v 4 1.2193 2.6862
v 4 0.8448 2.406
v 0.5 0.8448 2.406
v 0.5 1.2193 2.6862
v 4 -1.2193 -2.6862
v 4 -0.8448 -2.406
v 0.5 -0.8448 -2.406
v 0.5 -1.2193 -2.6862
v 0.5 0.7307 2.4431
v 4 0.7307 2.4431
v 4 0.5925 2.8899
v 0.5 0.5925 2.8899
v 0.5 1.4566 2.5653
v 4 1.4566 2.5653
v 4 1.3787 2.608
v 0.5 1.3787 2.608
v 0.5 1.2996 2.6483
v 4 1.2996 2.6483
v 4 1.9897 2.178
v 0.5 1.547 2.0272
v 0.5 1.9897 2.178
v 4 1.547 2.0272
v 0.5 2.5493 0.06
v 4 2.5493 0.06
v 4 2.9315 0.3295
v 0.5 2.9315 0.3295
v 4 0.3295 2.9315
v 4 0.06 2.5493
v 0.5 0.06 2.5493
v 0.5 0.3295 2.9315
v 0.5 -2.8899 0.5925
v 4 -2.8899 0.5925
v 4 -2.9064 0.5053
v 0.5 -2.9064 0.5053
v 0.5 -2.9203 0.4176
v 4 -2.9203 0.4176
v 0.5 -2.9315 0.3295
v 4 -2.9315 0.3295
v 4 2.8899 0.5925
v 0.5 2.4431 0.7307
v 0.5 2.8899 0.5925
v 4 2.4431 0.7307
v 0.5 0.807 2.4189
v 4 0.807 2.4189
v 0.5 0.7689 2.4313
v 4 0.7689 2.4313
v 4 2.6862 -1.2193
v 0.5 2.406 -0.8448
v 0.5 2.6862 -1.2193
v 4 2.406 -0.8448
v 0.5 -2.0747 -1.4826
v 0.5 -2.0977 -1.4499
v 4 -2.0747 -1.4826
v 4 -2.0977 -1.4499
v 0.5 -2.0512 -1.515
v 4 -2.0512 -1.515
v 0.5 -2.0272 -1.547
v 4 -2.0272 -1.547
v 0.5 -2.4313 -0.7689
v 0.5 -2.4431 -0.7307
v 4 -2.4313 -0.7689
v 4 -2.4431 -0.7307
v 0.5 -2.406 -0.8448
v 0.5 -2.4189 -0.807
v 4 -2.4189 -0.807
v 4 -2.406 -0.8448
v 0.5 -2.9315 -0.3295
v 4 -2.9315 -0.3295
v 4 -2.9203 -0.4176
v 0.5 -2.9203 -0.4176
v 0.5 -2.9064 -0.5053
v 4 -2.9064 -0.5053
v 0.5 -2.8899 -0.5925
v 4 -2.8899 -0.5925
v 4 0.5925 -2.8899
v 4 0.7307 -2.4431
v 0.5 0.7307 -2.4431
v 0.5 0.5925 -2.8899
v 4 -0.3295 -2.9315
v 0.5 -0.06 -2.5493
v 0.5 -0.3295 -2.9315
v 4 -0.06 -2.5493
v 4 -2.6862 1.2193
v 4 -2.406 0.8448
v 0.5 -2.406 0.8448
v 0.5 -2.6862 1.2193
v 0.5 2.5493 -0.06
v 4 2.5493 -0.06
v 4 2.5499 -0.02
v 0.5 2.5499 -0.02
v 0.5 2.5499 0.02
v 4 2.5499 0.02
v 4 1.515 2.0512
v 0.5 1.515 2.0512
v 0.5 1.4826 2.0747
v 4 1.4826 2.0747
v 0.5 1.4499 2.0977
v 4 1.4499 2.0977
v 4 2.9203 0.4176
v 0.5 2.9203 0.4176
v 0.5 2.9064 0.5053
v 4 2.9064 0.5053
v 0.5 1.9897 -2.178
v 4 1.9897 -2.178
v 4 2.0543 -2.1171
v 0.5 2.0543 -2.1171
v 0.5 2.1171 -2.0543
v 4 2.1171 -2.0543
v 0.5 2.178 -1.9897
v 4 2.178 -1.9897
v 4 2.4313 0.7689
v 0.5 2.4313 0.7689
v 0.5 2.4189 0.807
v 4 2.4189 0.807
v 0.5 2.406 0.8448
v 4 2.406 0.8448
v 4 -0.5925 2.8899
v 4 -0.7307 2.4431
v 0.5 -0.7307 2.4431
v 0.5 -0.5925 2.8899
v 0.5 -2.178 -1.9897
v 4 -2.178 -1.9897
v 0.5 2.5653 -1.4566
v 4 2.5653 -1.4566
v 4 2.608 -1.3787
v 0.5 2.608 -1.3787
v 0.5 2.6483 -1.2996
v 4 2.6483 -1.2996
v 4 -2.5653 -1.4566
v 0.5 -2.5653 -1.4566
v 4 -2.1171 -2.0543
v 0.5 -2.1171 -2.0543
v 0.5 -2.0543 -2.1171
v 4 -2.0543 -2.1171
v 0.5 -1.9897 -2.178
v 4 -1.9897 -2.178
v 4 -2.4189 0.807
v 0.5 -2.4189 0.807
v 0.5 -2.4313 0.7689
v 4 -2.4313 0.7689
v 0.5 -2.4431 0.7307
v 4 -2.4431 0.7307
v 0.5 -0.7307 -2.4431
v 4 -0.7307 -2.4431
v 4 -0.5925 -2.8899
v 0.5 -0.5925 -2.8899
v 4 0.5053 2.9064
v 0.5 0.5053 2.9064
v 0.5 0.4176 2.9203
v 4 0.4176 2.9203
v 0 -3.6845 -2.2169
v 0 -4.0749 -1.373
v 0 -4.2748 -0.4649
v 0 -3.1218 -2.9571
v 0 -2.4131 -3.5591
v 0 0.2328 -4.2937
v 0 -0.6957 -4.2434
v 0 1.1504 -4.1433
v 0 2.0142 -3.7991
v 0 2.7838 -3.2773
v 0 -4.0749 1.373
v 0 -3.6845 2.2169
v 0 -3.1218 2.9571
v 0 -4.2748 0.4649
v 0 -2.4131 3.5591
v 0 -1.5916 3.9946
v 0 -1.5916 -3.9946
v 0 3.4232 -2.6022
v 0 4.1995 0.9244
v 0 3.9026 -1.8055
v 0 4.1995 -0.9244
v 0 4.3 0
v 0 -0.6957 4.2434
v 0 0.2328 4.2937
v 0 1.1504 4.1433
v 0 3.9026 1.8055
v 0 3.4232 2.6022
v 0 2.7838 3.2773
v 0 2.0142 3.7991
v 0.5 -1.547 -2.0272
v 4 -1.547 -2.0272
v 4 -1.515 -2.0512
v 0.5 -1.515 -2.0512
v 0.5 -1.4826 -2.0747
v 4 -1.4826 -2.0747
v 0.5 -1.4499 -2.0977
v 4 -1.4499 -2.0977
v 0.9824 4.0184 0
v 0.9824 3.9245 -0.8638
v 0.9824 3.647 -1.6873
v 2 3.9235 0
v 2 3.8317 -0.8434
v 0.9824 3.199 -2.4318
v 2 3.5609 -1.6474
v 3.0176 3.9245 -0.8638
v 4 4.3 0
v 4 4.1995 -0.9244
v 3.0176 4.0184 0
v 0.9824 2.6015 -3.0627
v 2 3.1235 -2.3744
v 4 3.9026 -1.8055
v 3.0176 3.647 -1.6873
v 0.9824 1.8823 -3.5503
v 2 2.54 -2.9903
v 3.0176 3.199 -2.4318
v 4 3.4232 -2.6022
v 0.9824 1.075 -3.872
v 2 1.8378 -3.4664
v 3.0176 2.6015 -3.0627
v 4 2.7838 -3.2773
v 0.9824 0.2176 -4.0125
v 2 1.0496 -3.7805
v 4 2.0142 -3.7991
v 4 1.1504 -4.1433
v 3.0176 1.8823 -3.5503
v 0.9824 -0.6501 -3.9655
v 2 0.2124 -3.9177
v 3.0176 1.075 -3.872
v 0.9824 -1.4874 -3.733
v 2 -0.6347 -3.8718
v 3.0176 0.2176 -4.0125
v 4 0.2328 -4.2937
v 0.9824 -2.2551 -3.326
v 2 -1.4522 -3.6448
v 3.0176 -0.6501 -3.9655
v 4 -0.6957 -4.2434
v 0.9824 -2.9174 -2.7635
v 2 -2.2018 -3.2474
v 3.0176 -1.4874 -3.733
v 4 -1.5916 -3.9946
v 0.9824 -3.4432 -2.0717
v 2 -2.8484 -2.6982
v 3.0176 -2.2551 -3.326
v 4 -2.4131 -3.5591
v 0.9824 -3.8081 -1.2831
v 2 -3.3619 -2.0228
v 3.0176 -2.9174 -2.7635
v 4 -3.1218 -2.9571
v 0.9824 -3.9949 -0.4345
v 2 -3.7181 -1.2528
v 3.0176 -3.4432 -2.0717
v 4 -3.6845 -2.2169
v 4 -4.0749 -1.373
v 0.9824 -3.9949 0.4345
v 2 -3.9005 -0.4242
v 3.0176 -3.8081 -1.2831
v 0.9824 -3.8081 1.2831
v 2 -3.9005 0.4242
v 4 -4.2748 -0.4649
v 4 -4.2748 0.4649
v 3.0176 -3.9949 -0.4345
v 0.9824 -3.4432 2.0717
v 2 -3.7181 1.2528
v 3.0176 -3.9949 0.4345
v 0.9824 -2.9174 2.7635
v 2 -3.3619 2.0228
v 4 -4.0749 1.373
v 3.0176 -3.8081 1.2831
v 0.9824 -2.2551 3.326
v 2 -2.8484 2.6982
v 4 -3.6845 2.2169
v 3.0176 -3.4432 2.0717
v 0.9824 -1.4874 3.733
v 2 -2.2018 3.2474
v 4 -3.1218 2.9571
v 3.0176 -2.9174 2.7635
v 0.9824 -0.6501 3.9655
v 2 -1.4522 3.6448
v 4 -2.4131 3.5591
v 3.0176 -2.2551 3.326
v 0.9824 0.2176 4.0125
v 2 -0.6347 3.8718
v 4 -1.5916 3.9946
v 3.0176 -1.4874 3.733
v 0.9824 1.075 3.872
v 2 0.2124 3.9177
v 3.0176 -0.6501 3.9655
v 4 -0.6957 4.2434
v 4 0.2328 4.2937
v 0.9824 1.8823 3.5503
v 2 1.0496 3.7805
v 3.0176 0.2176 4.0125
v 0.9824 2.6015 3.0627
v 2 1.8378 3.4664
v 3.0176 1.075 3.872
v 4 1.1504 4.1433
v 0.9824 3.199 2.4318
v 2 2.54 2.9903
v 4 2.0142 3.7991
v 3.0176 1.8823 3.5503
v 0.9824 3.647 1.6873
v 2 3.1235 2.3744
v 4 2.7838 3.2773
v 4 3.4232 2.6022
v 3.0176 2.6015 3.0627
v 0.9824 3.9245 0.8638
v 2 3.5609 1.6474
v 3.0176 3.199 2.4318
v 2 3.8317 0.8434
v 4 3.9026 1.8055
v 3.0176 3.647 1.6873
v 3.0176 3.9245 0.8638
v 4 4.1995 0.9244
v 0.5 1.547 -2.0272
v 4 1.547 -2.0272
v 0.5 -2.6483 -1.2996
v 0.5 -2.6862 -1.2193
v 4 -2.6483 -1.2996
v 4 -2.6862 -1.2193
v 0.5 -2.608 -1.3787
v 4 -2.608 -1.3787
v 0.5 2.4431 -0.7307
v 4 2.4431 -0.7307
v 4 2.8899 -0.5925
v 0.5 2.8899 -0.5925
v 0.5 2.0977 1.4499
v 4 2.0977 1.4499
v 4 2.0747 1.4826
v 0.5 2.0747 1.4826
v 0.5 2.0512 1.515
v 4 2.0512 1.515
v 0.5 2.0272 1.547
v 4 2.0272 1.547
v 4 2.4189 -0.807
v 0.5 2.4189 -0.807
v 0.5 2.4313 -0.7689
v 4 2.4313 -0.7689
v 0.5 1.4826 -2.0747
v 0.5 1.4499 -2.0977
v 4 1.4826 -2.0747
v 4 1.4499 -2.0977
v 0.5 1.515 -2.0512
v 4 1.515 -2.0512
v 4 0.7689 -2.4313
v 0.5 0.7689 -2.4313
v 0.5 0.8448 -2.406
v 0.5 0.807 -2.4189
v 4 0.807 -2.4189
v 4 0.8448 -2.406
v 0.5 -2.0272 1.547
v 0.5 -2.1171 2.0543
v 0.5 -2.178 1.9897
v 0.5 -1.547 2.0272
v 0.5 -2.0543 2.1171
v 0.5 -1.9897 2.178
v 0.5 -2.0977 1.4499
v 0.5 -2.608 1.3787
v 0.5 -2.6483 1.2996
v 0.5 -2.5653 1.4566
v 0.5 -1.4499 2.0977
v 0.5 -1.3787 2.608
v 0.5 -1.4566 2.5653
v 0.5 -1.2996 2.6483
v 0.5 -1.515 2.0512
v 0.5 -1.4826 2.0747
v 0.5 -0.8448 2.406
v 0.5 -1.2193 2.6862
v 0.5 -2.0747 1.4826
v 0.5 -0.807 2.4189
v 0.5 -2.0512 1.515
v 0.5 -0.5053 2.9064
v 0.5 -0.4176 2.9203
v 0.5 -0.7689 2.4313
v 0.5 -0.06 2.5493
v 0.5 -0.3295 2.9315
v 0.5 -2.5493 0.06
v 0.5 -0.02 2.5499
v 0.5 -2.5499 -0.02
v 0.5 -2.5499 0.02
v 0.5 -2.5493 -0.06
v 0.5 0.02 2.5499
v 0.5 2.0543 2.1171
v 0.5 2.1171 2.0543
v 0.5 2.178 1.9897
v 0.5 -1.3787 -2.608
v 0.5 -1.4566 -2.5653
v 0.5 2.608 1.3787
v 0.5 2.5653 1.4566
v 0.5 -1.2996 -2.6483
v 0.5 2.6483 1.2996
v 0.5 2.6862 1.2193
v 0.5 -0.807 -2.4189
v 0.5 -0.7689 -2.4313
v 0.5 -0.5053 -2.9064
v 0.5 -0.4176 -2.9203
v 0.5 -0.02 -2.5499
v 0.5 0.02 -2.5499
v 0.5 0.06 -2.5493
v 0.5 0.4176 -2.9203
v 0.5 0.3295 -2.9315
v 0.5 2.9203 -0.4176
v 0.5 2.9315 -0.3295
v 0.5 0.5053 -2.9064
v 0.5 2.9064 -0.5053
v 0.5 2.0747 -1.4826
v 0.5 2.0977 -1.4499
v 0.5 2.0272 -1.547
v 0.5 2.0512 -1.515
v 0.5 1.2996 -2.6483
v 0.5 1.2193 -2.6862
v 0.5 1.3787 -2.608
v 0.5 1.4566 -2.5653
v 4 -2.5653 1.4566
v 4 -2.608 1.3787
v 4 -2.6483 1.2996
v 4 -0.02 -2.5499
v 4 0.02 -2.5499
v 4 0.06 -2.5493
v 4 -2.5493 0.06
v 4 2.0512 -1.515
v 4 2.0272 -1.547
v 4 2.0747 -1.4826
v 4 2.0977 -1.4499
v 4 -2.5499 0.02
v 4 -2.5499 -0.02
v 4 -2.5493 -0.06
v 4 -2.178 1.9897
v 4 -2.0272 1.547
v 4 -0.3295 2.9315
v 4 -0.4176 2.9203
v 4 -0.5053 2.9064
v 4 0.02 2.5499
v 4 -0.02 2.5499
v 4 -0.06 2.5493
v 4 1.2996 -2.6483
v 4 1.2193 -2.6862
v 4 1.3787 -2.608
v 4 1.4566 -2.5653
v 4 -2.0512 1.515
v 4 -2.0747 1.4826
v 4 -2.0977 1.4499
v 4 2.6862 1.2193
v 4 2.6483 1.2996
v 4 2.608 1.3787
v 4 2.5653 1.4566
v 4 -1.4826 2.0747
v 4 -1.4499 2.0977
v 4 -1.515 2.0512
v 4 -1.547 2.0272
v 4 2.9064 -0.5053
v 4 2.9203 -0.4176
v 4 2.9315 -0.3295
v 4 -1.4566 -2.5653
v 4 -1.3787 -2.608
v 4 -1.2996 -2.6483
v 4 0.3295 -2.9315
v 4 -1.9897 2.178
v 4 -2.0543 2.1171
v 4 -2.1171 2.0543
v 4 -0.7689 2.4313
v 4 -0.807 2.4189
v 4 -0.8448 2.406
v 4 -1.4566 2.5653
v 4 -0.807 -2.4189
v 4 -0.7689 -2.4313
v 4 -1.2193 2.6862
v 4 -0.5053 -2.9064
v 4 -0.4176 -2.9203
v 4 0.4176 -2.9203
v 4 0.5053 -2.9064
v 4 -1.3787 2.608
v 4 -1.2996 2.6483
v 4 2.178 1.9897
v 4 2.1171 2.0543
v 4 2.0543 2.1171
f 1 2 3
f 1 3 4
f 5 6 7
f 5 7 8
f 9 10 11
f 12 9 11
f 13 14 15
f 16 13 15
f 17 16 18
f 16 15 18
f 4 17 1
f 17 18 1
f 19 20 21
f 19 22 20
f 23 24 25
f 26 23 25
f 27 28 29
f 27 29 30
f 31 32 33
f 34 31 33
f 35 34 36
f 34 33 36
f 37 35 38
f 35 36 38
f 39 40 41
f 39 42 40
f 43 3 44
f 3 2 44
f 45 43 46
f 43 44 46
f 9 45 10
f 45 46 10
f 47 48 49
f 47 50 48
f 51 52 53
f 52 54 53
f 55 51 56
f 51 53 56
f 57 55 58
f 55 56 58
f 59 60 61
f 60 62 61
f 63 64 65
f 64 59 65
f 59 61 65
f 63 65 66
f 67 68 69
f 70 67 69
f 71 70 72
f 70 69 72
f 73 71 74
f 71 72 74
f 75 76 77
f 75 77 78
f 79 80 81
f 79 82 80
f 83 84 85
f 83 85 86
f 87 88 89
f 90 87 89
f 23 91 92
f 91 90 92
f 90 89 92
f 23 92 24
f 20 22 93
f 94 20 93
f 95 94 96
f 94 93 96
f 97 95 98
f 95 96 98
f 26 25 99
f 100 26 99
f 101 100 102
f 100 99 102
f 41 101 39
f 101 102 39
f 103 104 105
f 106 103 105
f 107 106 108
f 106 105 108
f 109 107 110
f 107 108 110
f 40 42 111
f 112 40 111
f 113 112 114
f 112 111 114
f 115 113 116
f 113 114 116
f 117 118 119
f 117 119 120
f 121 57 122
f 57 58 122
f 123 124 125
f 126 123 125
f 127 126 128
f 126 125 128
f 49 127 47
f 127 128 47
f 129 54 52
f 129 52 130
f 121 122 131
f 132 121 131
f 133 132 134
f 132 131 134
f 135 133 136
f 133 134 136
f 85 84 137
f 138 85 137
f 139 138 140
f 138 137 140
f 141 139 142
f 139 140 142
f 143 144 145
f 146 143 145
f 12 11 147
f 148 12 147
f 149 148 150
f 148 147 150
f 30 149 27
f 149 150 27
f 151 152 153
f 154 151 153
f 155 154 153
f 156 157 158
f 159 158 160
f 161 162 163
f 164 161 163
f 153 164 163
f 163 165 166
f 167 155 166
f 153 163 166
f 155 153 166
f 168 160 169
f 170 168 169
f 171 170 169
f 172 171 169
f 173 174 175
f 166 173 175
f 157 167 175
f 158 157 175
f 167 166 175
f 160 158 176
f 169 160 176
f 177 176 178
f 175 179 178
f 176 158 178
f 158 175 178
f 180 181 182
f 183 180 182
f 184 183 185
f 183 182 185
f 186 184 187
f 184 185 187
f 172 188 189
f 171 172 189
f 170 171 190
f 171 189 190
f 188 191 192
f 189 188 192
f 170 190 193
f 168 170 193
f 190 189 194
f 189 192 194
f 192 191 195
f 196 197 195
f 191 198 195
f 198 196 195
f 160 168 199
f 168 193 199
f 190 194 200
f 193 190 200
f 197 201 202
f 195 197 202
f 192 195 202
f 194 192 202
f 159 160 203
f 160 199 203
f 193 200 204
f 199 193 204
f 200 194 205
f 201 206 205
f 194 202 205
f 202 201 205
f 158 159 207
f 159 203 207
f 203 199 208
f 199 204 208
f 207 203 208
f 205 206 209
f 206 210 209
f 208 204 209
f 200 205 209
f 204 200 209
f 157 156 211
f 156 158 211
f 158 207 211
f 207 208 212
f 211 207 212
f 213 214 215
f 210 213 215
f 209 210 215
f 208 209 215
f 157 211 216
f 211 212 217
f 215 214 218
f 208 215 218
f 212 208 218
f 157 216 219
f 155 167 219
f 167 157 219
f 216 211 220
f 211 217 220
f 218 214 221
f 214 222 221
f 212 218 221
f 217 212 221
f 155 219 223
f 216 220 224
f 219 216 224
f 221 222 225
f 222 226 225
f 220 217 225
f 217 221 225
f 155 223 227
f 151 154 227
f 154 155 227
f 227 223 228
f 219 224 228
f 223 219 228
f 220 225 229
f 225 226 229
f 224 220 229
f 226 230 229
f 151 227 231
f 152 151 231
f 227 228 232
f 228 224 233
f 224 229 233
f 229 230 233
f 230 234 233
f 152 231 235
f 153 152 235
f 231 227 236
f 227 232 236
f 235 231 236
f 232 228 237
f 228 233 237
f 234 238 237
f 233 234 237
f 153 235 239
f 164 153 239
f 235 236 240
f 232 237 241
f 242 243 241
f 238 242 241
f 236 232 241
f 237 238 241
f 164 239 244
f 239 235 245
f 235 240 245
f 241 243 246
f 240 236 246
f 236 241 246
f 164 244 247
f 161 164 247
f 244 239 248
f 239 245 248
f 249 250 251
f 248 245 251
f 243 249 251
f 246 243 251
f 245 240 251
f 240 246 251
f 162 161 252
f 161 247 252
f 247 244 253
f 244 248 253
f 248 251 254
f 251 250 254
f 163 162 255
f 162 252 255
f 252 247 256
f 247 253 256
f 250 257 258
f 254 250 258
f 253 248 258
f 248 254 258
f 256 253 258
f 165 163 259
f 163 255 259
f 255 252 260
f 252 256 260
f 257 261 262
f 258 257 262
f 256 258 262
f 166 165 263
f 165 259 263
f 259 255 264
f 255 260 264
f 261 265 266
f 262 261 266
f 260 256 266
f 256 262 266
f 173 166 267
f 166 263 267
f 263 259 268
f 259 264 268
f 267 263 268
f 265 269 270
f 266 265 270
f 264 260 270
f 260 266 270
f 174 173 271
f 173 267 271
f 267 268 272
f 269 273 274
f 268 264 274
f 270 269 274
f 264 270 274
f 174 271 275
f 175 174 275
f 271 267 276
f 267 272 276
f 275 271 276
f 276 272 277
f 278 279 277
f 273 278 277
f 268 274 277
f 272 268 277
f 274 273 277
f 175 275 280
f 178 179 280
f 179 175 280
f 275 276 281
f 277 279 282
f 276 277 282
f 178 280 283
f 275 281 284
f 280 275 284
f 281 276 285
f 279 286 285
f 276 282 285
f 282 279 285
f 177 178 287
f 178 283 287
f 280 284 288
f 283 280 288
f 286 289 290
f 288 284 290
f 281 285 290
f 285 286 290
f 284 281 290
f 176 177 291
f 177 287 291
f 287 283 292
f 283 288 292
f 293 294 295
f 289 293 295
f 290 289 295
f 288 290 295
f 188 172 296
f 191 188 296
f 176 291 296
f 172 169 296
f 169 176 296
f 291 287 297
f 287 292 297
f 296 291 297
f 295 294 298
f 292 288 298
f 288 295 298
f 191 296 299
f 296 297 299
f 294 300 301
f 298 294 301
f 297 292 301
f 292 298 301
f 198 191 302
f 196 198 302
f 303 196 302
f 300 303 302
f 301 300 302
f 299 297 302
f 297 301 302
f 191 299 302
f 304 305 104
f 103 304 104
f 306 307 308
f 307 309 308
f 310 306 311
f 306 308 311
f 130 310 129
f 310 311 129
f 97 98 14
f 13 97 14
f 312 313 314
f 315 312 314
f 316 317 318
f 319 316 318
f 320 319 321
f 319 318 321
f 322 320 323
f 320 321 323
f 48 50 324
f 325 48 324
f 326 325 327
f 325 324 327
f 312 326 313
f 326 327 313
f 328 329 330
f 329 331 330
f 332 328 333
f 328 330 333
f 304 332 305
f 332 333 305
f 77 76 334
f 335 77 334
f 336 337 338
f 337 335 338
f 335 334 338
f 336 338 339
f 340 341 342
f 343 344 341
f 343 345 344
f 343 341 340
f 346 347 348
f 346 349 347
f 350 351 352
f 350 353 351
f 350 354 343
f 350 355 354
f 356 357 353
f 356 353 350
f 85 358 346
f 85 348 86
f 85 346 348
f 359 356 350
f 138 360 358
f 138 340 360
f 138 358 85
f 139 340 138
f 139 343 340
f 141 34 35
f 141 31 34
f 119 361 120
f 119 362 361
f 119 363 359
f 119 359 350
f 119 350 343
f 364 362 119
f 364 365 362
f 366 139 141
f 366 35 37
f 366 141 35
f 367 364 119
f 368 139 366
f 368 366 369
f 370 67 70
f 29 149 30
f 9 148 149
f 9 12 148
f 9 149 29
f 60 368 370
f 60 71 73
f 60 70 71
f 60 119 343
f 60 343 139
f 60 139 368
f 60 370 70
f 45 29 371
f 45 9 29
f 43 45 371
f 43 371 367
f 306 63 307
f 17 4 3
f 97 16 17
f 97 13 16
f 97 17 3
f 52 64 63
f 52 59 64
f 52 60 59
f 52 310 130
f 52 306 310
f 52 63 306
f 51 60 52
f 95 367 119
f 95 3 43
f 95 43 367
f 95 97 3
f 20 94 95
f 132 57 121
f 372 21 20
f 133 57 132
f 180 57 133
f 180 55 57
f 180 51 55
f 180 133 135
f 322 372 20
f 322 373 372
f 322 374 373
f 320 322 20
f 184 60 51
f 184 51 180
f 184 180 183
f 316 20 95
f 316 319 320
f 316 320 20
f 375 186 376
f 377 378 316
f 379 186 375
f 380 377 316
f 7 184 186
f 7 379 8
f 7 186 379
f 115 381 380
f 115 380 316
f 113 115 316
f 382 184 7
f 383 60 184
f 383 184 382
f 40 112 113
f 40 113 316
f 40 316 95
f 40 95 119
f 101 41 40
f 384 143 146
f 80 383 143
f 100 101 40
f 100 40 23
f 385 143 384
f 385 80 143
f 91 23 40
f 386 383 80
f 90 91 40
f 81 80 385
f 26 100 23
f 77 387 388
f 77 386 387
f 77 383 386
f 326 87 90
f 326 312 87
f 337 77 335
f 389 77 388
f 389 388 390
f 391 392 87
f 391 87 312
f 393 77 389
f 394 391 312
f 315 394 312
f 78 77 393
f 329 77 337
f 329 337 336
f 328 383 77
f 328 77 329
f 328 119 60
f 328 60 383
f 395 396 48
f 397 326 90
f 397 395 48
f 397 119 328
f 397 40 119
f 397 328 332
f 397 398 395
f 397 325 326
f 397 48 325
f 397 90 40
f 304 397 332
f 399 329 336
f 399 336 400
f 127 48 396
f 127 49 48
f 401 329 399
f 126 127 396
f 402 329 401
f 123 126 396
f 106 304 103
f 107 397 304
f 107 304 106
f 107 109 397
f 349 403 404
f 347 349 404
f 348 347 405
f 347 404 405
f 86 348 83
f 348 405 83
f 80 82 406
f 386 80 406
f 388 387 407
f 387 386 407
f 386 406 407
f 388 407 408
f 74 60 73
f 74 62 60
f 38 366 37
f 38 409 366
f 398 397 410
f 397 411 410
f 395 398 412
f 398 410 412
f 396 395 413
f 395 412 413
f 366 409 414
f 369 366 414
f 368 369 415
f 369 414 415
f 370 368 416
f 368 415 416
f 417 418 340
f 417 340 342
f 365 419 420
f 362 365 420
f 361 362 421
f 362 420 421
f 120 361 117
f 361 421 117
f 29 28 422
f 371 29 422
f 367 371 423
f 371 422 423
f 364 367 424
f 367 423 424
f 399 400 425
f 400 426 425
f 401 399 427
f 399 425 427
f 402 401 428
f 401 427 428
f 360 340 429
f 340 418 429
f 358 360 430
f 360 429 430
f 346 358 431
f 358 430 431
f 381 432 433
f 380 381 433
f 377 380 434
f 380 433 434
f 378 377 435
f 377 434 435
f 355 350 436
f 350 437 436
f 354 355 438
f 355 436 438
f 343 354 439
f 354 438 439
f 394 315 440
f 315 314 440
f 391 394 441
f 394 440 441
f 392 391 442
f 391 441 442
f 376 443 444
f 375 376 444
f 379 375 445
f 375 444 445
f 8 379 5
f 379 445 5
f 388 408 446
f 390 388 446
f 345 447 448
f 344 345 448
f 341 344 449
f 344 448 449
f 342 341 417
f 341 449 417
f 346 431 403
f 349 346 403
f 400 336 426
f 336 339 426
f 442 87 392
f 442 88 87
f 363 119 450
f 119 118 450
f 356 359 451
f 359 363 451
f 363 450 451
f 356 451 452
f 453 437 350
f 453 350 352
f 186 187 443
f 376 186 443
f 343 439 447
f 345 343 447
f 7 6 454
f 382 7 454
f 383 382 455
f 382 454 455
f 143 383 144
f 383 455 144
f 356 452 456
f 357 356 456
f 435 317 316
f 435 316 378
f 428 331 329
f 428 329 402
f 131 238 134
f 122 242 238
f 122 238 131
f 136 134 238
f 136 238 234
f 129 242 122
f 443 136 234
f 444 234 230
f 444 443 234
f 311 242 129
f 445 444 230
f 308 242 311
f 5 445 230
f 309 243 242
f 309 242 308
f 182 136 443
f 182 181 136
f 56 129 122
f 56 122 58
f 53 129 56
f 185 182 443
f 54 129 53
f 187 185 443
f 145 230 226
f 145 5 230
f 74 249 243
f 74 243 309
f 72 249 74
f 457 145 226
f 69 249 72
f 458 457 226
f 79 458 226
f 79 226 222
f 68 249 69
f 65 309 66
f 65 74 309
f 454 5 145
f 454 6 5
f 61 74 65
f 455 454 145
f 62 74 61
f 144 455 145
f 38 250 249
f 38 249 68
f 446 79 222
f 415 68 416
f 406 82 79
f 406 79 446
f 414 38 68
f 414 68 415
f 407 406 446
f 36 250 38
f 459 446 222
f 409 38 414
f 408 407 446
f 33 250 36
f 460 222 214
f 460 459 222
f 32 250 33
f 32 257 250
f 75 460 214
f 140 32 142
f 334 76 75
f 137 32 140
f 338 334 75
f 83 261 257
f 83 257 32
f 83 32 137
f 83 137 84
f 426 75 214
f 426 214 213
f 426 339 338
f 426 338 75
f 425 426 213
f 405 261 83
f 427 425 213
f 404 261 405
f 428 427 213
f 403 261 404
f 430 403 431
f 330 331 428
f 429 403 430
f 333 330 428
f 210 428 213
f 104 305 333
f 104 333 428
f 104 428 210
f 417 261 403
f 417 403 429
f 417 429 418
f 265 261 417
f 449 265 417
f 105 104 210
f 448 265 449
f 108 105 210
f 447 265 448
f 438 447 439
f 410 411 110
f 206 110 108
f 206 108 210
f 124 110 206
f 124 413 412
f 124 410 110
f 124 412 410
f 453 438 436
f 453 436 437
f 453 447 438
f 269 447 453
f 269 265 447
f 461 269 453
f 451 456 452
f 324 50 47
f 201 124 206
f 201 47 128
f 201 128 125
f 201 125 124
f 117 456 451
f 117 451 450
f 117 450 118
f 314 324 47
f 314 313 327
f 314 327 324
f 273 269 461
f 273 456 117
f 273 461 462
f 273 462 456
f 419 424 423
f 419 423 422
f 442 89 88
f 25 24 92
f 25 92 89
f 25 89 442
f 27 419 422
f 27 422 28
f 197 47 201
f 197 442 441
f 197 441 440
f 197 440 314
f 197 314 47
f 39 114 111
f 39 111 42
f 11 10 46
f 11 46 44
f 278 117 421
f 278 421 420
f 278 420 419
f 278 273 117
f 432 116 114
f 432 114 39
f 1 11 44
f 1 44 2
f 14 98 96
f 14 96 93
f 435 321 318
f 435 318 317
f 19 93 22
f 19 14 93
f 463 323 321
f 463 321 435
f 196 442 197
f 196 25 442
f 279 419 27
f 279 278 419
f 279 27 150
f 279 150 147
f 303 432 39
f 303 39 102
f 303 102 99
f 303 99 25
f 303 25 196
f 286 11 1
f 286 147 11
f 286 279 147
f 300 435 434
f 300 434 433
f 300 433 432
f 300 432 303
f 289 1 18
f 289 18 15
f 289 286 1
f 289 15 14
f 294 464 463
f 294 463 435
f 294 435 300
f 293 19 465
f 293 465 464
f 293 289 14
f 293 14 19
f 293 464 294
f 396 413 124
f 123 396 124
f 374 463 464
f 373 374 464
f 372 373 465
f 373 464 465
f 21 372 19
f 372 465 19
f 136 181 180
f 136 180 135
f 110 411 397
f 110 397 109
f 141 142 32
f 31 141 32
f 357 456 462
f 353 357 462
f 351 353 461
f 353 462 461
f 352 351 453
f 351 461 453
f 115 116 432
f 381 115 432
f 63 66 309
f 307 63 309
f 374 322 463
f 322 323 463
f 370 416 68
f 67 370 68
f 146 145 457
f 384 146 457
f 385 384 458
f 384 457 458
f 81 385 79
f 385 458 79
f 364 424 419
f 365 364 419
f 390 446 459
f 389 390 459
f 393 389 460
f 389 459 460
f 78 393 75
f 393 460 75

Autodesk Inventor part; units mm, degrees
ref_plane "YZ Plane" through (0, 0, 0) normal (1, 0, 0) x (0, 1, 0)
ref_plane "XZ Plane" through (0, 0, 0) normal (0, 1, 0) x (-1, 0, 0)
ref_plane "XY Plane" through (0, 0, 0) normal (0, 0, 1) x (1, 0, 0)
sketch "Esboço2" plane through (0, 0, 0) normal (0, 0, 1) x (1, 0, 0)
  line L0 (0, 0) -> (4, 0)
  line L1 (4, 0) -> (4, 4.3)
  line L2 (0, 4.3) -> (0, 0)
  arc A0 (0, 4.3) -> (4, 4.3) centre (2, 9.4235) ccw
  dimension "d0" = 4
  dimension "d1" = 4.3
  dimension "d70" = 5.5
revolve "Revolução1" add sketch "Esboço2" angle 360 about axis through (0, 0, 0) along (1, 0, 0)
sketch "Esboço11" plane through (4, 0, 0) normal (1, 0, 0) x (0, 0, -1)
  circle A0 centre (0, 0) radius 2.55
  circle A1 centre (0, 0) radius 2.95
  line L0 (0, 0) -> (2.95, 0)
  line L1 (2.55, 0) -> (2.5493, 0.06)
  line L2 (2.5493, 0.06) -> (2.55, 0)
  line L3 (2.55, 0) -> (2.5493, -0.06)
  line L4 (2.5493, 0.06) -> (2.9315, 0.3295)
  line L5 (2.5493, -0.06) -> (2.9315, -0.3295)
  line L6 (2.9315, 0.3295) -> (2.9255, 0.3791)
  line L7 (2.9315, -0.3295) -> (2.9255, -0.3791)
  line L8 (2.406, 0.8448) -> (2.6862, 1.2193)
  line L9 (2.4252, 0.788) -> (2.406, 0.8448)
  line L10 (2.4252, 0.788) -> (2.4431, 0.7307)
  line L11 (2.4431, 0.7307) -> (2.8899, 0.5925)
  circle A2 centre (0, 0) radius 2.95
  line L12 (2.6862, 1.2193) -> (2.6652, 1.2646)
  line L13 (2.8899, 0.5925) -> (2.8995, 0.5435)
  line L14 (2.0272, 1.547) -> (2.178, 1.9897)
  line L15 (2.063, 1.4989) -> (2.0272, 1.547)
  line L16 (2.063, 1.4989) -> (2.0977, 1.4499)
  line L17 (2.0977, 1.4499) -> (2.5653, 1.4566)
  circle A3 centre (0, 0) radius 2.95
  line L18 (2.178, 1.9897) -> (2.144, 2.0263)
  line L19 (2.5653, 1.4566) -> (2.5897, 1.4129)
  line L20 (1.4499, 2.0977) -> (1.4566, 2.5653)
  line L21 (1.4989, 2.063) -> (1.4499, 2.0977)
  line L22 (1.4989, 2.063) -> (1.547, 2.0272)
  line L23 (1.547, 2.0272) -> (1.9897, 2.178)
  circle A4 centre (0, 0) radius 2.95
  line L24 (1.4566, 2.5653) -> (1.4129, 2.5897)
  line L25 (1.9897, 2.178) -> (2.0263, 2.144)
  line L26 (0.7307, 2.4431) -> (0.5925, 2.8899)
  line L27 (0.788, 2.4252) -> (0.7307, 2.4431)
  line L28 (0.788, 2.4252) -> (0.8448, 2.406)
  line L29 (0.8448, 2.406) -> (1.2193, 2.6862)
  circle A5 centre (0, 0) radius 2.95
  line L30 (0.5925, 2.8899) -> (0.5435, 2.8995)
  line L31 (1.2193, 2.6862) -> (1.2646, 2.6652)
  line L32 (-0.06, 2.5493) -> (-0.3295, 2.9315)
  line L33 (0, 2.55) -> (-0.06, 2.5493)
  line L34 (0, 2.55) -> (0.06, 2.5493)
  line L35 (0.06, 2.5493) -> (0.3295, 2.9315)
  circle A6 centre (0, 0) radius 2.95
  line L36 (-0.3295, 2.9315) -> (-0.3791, 2.9255)
  line L37 (0.3295, 2.9315) -> (0.3791, 2.9255)
  line L38 (-0.8448, 2.406) -> (-1.2193, 2.6862)
  line L39 (-0.788, 2.4252) -> (-0.8448, 2.406)
  line L40 (-0.788, 2.4252) -> (-0.7307, 2.4431)
  line L41 (-0.7307, 2.4431) -> (-0.5925, 2.8899)
  circle A7 centre (0, 0) radius 2.95
  line L42 (-1.2193, 2.6862) -> (-1.2646, 2.6652)
  line L43 (-0.5925, 2.8899) -> (-0.5435, 2.8995)
  line L44 (-1.547, 2.0272) -> (-1.9897, 2.178)
  line L45 (-1.4989, 2.063) -> (-1.547, 2.0272)
  line L46 (-1.4989, 2.063) -> (-1.4499, 2.0977)
  line L47 (-1.4499, 2.0977) -> (-1.4566, 2.5653)
  circle A8 centre (0, 0) radius 2.95
  line L48 (-1.9897, 2.178) -> (-2.0263, 2.144)
  line L49 (-1.4566, 2.5653) -> (-1.4129, 2.5897)
  line L50 (-2.0977, 1.4499) -> (-2.5653, 1.4566)
  line L51 (-2.063, 1.4989) -> (-2.0977, 1.4499)
  line L52 (-2.063, 1.4989) -> (-2.0272, 1.547)
  line L53 (-2.0272, 1.547) -> (-2.178, 1.9897)
  circle A9 centre (0, 0) radius 2.95
  line L54 (-2.5653, 1.4566) -> (-2.5897, 1.4129)
  line L55 (-2.178, 1.9897) -> (-2.144, 2.0263)
  line L56 (-2.4431, 0.7307) -> (-2.8899, 0.5925)
  line L57 (-2.4252, 0.788) -> (-2.4431, 0.7307)
  line L58 (-2.4252, 0.788) -> (-2.406, 0.8448)
  line L59 (-2.406, 0.8448) -> (-2.6862, 1.2193)
  circle A10 centre (0, 0) radius 2.95
  line L60 (-2.8899, 0.5925) -> (-2.8995, 0.5435)
  line L61 (-2.6862, 1.2193) -> (-2.6652, 1.2646)
  line L62 (-2.5493, -0.06) -> (-2.9315, -0.3295)
  line L63 (-2.55, 0) -> (-2.5493, -0.06)
  line L64 (-2.55, 0) -> (-2.5493, 0.06)
  line L65 (-2.5493, 0.06) -> (-2.9315, 0.3295)
  circle A11 centre (0, 0) radius 2.95
  line L66 (-2.9315, -0.3295) -> (-2.9255, -0.3791)
  line L67 (-2.9315, 0.3295) -> (-2.9255, 0.3791)
  line L68 (-2.406, -0.8448) -> (-2.6862, -1.2193)
  line L69 (-2.4252, -0.788) -> (-2.406, -0.8448)
  line L70 (-2.4252, -0.788) -> (-2.4431, -0.7307)
  line L71 (-2.4431, -0.7307) -> (-2.8899, -0.5925)
  circle A12 centre (0, 0) radius 2.95
  line L72 (-2.6862, -1.2193) -> (-2.6652, -1.2646)
  line L73 (-2.8899, -0.5925) -> (-2.8995, -0.5435)
  line L74 (-2.0272, -1.547) -> (-2.178, -1.9897)
  line L75 (-2.063, -1.4989) -> (-2.0272, -1.547)
  line L76 (-2.063, -1.4989) -> (-2.0977, -1.4499)
  line L77 (-2.0977, -1.4499) -> (-2.5653, -1.4566)
  circle A13 centre (0, 0) radius 2.95
  line L78 (-2.178, -1.9897) -> (-2.144, -2.0263)
  line L79 (-2.5653, -1.4566) -> (-2.5897, -1.4129)
  line L80 (-1.4499, -2.0977) -> (-1.4566, -2.5653)
  line L81 (-1.4989, -2.063) -> (-1.4499, -2.0977)
  line L82 (-1.4989, -2.063) -> (-1.547, -2.0272)
  line L83 (-1.547, -2.0272) -> (-1.9897, -2.178)
  circle A14 centre (0, 0) radius 2.95
  line L84 (-1.4566, -2.5653) -> (-1.4129, -2.5897)
  line L85 (-1.9897, -2.178) -> (-2.0263, -2.144)
  line L86 (-0.7307, -2.4431) -> (-0.5925, -2.8899)
  line L87 (-0.788, -2.4252) -> (-0.7307, -2.4431)
  line L88 (-0.788, -2.4252) -> (-0.8448, -2.406)
  line L89 (-0.8448, -2.406) -> (-1.2193, -2.6862)
  circle A15 centre (0, 0) radius 2.95
  line L90 (-0.5925, -2.8899) -> (-0.5435, -2.8995)
  line L91 (-1.2193, -2.6862) -> (-1.2646, -2.6652)
  line L92 (0.06, -2.5493) -> (0.3295, -2.9315)
  line L93 (0, -2.55) -> (0.06, -2.5493)
  line L94 (0, -2.55) -> (-0.06, -2.5493)
  line L95 (-0.06, -2.5493) -> (-0.3295, -2.9315)
  circle A16 centre (0, 0) radius 2.95
  line L96 (0.3295, -2.9315) -> (0.3791, -2.9255)
  line L97 (-0.3295, -2.9315) -> (-0.3791, -2.9255)
  line L98 (0.8448, -2.406) -> (1.2193, -2.6862)
  line L99 (0.788, -2.4252) -> (0.8448, -2.406)
  line L100 (0.788, -2.4252) -> (0.7307, -2.4431)
  line L101 (0.7307, -2.4431) -> (0.5925, -2.8899)
  circle A17 centre (0, 0) radius 2.95
  line L102 (1.2193, -2.6862) -> (1.2646, -2.6652)
  line L103 (0.5925, -2.8899) -> (0.5435, -2.8995)
  line L104 (1.547, -2.0272) -> (1.9897, -2.178)
  line L105 (1.4989, -2.063) -> (1.547, -2.0272)
  line L106 (1.4989, -2.063) -> (1.4499, -2.0977)
  line L107 (1.4499, -2.0977) -> (1.4566, -2.5653)
  circle A18 centre (0, 0) radius 2.95
  line L108 (1.9897, -2.178) -> (2.0263, -2.144)
  line L109 (1.4566, -2.5653) -> (1.4129, -2.5897)
  line L110 (2.0977, -1.4499) -> (2.5653, -1.4566)
  line L111 (2.063, -1.4989) -> (2.0977, -1.4499)
  line L112 (2.063, -1.4989) -> (2.0272, -1.547)
  line L113 (2.0272, -1.547) -> (2.178, -1.9897)
  circle A19 centre (0, 0) radius 2.95
  line L114 (2.5653, -1.4566) -> (2.5897, -1.4129)
  line L115 (2.178, -1.9897) -> (2.144, -2.0263)
  line L116 (2.4431, -0.7307) -> (2.8899, -0.5925)
  line L117 (2.4252, -0.788) -> (2.4431, -0.7307)
  line L118 (2.4252, -0.788) -> (2.406, -0.8448)
  line L119 (2.406, -0.8448) -> (2.6862, -1.2193)
  circle A20 centre (0, 0) radius 2.95
  line L120 (2.8899, -0.5925) -> (2.8995, -0.5435)
  line L121 (2.6862, -1.2193) -> (2.6652, -1.2646)
  point P0 (2.8056, 0.9116)
  point P1 (2.3866, 1.734)
  point P2 (1.734, 2.3866)
  point P3 (0.9116, 2.8056)
  point P4 (0, 2.95)
  point P5 (-0.9116, 2.8056)
  point P6 (-1.734, 2.3866)
  point P7 (-2.3866, 1.734)
  point P8 (-2.8056, 0.9116)
  point P9 (-2.95, 0)
  point P10 (-2.8056, -0.9116)
  point P11 (-2.3866, -1.734)
  point P12 (-1.734, -2.3866)
  point P13 (-0.9116, -2.8056)
  point P14 (0, -2.95)
  point P15 (0.9116, -2.8056)
  point P16 (1.734, -2.3866)
  point P17 (2.3866, -1.734)
  point P18 (2.8056, -0.9116)
  dimension "d59" = 5.9
  dimension "d58" = 5.1
  dimension "d60" = 0.06
  dimension "d61" = 0.06
  dimension "d62" = 0.05
  dimension "d63" = 0.05
  dimension "d66" = 360
extrude "Extrusão5" cut sketch "Esboço11" against normal blind 3.5 contours A0 | A0 L11 A1 L4 | L5 A1 L116 A0 | A0 L17 A1 L8 | L119 A1 L110 A0 | A0 L23 A1 L14 | L113 A1 L104 A0 | A0 L29 A1 L20 | L107 A1 L98 A0 | A0 L35 A1 L26 | L101 A1 L92 A0 | A0 L41 A1 L32 | L95 A1 L86 A0 | A0 L47 A1 L38 | L89 A1 L80 A0 | A0 L53 A1 L44 | L83 A1 L74 A0 | A0 L59 A1 L50 | L77 A1 L68 A0 | A0 L65 A1 L56 | L71 A1 L62 A0
sketch "Esboço12" plane through (4, 0, 0) normal (1, 0, 0) x (0, 0, -1)
  point P0 (0, 0)
sketch "Esboço13" plane through (0.5, 0, 0) normal (1, 0, 0) x (0, 0, -1)
  point P0 (0, 0)
properties part number "roda corda"
